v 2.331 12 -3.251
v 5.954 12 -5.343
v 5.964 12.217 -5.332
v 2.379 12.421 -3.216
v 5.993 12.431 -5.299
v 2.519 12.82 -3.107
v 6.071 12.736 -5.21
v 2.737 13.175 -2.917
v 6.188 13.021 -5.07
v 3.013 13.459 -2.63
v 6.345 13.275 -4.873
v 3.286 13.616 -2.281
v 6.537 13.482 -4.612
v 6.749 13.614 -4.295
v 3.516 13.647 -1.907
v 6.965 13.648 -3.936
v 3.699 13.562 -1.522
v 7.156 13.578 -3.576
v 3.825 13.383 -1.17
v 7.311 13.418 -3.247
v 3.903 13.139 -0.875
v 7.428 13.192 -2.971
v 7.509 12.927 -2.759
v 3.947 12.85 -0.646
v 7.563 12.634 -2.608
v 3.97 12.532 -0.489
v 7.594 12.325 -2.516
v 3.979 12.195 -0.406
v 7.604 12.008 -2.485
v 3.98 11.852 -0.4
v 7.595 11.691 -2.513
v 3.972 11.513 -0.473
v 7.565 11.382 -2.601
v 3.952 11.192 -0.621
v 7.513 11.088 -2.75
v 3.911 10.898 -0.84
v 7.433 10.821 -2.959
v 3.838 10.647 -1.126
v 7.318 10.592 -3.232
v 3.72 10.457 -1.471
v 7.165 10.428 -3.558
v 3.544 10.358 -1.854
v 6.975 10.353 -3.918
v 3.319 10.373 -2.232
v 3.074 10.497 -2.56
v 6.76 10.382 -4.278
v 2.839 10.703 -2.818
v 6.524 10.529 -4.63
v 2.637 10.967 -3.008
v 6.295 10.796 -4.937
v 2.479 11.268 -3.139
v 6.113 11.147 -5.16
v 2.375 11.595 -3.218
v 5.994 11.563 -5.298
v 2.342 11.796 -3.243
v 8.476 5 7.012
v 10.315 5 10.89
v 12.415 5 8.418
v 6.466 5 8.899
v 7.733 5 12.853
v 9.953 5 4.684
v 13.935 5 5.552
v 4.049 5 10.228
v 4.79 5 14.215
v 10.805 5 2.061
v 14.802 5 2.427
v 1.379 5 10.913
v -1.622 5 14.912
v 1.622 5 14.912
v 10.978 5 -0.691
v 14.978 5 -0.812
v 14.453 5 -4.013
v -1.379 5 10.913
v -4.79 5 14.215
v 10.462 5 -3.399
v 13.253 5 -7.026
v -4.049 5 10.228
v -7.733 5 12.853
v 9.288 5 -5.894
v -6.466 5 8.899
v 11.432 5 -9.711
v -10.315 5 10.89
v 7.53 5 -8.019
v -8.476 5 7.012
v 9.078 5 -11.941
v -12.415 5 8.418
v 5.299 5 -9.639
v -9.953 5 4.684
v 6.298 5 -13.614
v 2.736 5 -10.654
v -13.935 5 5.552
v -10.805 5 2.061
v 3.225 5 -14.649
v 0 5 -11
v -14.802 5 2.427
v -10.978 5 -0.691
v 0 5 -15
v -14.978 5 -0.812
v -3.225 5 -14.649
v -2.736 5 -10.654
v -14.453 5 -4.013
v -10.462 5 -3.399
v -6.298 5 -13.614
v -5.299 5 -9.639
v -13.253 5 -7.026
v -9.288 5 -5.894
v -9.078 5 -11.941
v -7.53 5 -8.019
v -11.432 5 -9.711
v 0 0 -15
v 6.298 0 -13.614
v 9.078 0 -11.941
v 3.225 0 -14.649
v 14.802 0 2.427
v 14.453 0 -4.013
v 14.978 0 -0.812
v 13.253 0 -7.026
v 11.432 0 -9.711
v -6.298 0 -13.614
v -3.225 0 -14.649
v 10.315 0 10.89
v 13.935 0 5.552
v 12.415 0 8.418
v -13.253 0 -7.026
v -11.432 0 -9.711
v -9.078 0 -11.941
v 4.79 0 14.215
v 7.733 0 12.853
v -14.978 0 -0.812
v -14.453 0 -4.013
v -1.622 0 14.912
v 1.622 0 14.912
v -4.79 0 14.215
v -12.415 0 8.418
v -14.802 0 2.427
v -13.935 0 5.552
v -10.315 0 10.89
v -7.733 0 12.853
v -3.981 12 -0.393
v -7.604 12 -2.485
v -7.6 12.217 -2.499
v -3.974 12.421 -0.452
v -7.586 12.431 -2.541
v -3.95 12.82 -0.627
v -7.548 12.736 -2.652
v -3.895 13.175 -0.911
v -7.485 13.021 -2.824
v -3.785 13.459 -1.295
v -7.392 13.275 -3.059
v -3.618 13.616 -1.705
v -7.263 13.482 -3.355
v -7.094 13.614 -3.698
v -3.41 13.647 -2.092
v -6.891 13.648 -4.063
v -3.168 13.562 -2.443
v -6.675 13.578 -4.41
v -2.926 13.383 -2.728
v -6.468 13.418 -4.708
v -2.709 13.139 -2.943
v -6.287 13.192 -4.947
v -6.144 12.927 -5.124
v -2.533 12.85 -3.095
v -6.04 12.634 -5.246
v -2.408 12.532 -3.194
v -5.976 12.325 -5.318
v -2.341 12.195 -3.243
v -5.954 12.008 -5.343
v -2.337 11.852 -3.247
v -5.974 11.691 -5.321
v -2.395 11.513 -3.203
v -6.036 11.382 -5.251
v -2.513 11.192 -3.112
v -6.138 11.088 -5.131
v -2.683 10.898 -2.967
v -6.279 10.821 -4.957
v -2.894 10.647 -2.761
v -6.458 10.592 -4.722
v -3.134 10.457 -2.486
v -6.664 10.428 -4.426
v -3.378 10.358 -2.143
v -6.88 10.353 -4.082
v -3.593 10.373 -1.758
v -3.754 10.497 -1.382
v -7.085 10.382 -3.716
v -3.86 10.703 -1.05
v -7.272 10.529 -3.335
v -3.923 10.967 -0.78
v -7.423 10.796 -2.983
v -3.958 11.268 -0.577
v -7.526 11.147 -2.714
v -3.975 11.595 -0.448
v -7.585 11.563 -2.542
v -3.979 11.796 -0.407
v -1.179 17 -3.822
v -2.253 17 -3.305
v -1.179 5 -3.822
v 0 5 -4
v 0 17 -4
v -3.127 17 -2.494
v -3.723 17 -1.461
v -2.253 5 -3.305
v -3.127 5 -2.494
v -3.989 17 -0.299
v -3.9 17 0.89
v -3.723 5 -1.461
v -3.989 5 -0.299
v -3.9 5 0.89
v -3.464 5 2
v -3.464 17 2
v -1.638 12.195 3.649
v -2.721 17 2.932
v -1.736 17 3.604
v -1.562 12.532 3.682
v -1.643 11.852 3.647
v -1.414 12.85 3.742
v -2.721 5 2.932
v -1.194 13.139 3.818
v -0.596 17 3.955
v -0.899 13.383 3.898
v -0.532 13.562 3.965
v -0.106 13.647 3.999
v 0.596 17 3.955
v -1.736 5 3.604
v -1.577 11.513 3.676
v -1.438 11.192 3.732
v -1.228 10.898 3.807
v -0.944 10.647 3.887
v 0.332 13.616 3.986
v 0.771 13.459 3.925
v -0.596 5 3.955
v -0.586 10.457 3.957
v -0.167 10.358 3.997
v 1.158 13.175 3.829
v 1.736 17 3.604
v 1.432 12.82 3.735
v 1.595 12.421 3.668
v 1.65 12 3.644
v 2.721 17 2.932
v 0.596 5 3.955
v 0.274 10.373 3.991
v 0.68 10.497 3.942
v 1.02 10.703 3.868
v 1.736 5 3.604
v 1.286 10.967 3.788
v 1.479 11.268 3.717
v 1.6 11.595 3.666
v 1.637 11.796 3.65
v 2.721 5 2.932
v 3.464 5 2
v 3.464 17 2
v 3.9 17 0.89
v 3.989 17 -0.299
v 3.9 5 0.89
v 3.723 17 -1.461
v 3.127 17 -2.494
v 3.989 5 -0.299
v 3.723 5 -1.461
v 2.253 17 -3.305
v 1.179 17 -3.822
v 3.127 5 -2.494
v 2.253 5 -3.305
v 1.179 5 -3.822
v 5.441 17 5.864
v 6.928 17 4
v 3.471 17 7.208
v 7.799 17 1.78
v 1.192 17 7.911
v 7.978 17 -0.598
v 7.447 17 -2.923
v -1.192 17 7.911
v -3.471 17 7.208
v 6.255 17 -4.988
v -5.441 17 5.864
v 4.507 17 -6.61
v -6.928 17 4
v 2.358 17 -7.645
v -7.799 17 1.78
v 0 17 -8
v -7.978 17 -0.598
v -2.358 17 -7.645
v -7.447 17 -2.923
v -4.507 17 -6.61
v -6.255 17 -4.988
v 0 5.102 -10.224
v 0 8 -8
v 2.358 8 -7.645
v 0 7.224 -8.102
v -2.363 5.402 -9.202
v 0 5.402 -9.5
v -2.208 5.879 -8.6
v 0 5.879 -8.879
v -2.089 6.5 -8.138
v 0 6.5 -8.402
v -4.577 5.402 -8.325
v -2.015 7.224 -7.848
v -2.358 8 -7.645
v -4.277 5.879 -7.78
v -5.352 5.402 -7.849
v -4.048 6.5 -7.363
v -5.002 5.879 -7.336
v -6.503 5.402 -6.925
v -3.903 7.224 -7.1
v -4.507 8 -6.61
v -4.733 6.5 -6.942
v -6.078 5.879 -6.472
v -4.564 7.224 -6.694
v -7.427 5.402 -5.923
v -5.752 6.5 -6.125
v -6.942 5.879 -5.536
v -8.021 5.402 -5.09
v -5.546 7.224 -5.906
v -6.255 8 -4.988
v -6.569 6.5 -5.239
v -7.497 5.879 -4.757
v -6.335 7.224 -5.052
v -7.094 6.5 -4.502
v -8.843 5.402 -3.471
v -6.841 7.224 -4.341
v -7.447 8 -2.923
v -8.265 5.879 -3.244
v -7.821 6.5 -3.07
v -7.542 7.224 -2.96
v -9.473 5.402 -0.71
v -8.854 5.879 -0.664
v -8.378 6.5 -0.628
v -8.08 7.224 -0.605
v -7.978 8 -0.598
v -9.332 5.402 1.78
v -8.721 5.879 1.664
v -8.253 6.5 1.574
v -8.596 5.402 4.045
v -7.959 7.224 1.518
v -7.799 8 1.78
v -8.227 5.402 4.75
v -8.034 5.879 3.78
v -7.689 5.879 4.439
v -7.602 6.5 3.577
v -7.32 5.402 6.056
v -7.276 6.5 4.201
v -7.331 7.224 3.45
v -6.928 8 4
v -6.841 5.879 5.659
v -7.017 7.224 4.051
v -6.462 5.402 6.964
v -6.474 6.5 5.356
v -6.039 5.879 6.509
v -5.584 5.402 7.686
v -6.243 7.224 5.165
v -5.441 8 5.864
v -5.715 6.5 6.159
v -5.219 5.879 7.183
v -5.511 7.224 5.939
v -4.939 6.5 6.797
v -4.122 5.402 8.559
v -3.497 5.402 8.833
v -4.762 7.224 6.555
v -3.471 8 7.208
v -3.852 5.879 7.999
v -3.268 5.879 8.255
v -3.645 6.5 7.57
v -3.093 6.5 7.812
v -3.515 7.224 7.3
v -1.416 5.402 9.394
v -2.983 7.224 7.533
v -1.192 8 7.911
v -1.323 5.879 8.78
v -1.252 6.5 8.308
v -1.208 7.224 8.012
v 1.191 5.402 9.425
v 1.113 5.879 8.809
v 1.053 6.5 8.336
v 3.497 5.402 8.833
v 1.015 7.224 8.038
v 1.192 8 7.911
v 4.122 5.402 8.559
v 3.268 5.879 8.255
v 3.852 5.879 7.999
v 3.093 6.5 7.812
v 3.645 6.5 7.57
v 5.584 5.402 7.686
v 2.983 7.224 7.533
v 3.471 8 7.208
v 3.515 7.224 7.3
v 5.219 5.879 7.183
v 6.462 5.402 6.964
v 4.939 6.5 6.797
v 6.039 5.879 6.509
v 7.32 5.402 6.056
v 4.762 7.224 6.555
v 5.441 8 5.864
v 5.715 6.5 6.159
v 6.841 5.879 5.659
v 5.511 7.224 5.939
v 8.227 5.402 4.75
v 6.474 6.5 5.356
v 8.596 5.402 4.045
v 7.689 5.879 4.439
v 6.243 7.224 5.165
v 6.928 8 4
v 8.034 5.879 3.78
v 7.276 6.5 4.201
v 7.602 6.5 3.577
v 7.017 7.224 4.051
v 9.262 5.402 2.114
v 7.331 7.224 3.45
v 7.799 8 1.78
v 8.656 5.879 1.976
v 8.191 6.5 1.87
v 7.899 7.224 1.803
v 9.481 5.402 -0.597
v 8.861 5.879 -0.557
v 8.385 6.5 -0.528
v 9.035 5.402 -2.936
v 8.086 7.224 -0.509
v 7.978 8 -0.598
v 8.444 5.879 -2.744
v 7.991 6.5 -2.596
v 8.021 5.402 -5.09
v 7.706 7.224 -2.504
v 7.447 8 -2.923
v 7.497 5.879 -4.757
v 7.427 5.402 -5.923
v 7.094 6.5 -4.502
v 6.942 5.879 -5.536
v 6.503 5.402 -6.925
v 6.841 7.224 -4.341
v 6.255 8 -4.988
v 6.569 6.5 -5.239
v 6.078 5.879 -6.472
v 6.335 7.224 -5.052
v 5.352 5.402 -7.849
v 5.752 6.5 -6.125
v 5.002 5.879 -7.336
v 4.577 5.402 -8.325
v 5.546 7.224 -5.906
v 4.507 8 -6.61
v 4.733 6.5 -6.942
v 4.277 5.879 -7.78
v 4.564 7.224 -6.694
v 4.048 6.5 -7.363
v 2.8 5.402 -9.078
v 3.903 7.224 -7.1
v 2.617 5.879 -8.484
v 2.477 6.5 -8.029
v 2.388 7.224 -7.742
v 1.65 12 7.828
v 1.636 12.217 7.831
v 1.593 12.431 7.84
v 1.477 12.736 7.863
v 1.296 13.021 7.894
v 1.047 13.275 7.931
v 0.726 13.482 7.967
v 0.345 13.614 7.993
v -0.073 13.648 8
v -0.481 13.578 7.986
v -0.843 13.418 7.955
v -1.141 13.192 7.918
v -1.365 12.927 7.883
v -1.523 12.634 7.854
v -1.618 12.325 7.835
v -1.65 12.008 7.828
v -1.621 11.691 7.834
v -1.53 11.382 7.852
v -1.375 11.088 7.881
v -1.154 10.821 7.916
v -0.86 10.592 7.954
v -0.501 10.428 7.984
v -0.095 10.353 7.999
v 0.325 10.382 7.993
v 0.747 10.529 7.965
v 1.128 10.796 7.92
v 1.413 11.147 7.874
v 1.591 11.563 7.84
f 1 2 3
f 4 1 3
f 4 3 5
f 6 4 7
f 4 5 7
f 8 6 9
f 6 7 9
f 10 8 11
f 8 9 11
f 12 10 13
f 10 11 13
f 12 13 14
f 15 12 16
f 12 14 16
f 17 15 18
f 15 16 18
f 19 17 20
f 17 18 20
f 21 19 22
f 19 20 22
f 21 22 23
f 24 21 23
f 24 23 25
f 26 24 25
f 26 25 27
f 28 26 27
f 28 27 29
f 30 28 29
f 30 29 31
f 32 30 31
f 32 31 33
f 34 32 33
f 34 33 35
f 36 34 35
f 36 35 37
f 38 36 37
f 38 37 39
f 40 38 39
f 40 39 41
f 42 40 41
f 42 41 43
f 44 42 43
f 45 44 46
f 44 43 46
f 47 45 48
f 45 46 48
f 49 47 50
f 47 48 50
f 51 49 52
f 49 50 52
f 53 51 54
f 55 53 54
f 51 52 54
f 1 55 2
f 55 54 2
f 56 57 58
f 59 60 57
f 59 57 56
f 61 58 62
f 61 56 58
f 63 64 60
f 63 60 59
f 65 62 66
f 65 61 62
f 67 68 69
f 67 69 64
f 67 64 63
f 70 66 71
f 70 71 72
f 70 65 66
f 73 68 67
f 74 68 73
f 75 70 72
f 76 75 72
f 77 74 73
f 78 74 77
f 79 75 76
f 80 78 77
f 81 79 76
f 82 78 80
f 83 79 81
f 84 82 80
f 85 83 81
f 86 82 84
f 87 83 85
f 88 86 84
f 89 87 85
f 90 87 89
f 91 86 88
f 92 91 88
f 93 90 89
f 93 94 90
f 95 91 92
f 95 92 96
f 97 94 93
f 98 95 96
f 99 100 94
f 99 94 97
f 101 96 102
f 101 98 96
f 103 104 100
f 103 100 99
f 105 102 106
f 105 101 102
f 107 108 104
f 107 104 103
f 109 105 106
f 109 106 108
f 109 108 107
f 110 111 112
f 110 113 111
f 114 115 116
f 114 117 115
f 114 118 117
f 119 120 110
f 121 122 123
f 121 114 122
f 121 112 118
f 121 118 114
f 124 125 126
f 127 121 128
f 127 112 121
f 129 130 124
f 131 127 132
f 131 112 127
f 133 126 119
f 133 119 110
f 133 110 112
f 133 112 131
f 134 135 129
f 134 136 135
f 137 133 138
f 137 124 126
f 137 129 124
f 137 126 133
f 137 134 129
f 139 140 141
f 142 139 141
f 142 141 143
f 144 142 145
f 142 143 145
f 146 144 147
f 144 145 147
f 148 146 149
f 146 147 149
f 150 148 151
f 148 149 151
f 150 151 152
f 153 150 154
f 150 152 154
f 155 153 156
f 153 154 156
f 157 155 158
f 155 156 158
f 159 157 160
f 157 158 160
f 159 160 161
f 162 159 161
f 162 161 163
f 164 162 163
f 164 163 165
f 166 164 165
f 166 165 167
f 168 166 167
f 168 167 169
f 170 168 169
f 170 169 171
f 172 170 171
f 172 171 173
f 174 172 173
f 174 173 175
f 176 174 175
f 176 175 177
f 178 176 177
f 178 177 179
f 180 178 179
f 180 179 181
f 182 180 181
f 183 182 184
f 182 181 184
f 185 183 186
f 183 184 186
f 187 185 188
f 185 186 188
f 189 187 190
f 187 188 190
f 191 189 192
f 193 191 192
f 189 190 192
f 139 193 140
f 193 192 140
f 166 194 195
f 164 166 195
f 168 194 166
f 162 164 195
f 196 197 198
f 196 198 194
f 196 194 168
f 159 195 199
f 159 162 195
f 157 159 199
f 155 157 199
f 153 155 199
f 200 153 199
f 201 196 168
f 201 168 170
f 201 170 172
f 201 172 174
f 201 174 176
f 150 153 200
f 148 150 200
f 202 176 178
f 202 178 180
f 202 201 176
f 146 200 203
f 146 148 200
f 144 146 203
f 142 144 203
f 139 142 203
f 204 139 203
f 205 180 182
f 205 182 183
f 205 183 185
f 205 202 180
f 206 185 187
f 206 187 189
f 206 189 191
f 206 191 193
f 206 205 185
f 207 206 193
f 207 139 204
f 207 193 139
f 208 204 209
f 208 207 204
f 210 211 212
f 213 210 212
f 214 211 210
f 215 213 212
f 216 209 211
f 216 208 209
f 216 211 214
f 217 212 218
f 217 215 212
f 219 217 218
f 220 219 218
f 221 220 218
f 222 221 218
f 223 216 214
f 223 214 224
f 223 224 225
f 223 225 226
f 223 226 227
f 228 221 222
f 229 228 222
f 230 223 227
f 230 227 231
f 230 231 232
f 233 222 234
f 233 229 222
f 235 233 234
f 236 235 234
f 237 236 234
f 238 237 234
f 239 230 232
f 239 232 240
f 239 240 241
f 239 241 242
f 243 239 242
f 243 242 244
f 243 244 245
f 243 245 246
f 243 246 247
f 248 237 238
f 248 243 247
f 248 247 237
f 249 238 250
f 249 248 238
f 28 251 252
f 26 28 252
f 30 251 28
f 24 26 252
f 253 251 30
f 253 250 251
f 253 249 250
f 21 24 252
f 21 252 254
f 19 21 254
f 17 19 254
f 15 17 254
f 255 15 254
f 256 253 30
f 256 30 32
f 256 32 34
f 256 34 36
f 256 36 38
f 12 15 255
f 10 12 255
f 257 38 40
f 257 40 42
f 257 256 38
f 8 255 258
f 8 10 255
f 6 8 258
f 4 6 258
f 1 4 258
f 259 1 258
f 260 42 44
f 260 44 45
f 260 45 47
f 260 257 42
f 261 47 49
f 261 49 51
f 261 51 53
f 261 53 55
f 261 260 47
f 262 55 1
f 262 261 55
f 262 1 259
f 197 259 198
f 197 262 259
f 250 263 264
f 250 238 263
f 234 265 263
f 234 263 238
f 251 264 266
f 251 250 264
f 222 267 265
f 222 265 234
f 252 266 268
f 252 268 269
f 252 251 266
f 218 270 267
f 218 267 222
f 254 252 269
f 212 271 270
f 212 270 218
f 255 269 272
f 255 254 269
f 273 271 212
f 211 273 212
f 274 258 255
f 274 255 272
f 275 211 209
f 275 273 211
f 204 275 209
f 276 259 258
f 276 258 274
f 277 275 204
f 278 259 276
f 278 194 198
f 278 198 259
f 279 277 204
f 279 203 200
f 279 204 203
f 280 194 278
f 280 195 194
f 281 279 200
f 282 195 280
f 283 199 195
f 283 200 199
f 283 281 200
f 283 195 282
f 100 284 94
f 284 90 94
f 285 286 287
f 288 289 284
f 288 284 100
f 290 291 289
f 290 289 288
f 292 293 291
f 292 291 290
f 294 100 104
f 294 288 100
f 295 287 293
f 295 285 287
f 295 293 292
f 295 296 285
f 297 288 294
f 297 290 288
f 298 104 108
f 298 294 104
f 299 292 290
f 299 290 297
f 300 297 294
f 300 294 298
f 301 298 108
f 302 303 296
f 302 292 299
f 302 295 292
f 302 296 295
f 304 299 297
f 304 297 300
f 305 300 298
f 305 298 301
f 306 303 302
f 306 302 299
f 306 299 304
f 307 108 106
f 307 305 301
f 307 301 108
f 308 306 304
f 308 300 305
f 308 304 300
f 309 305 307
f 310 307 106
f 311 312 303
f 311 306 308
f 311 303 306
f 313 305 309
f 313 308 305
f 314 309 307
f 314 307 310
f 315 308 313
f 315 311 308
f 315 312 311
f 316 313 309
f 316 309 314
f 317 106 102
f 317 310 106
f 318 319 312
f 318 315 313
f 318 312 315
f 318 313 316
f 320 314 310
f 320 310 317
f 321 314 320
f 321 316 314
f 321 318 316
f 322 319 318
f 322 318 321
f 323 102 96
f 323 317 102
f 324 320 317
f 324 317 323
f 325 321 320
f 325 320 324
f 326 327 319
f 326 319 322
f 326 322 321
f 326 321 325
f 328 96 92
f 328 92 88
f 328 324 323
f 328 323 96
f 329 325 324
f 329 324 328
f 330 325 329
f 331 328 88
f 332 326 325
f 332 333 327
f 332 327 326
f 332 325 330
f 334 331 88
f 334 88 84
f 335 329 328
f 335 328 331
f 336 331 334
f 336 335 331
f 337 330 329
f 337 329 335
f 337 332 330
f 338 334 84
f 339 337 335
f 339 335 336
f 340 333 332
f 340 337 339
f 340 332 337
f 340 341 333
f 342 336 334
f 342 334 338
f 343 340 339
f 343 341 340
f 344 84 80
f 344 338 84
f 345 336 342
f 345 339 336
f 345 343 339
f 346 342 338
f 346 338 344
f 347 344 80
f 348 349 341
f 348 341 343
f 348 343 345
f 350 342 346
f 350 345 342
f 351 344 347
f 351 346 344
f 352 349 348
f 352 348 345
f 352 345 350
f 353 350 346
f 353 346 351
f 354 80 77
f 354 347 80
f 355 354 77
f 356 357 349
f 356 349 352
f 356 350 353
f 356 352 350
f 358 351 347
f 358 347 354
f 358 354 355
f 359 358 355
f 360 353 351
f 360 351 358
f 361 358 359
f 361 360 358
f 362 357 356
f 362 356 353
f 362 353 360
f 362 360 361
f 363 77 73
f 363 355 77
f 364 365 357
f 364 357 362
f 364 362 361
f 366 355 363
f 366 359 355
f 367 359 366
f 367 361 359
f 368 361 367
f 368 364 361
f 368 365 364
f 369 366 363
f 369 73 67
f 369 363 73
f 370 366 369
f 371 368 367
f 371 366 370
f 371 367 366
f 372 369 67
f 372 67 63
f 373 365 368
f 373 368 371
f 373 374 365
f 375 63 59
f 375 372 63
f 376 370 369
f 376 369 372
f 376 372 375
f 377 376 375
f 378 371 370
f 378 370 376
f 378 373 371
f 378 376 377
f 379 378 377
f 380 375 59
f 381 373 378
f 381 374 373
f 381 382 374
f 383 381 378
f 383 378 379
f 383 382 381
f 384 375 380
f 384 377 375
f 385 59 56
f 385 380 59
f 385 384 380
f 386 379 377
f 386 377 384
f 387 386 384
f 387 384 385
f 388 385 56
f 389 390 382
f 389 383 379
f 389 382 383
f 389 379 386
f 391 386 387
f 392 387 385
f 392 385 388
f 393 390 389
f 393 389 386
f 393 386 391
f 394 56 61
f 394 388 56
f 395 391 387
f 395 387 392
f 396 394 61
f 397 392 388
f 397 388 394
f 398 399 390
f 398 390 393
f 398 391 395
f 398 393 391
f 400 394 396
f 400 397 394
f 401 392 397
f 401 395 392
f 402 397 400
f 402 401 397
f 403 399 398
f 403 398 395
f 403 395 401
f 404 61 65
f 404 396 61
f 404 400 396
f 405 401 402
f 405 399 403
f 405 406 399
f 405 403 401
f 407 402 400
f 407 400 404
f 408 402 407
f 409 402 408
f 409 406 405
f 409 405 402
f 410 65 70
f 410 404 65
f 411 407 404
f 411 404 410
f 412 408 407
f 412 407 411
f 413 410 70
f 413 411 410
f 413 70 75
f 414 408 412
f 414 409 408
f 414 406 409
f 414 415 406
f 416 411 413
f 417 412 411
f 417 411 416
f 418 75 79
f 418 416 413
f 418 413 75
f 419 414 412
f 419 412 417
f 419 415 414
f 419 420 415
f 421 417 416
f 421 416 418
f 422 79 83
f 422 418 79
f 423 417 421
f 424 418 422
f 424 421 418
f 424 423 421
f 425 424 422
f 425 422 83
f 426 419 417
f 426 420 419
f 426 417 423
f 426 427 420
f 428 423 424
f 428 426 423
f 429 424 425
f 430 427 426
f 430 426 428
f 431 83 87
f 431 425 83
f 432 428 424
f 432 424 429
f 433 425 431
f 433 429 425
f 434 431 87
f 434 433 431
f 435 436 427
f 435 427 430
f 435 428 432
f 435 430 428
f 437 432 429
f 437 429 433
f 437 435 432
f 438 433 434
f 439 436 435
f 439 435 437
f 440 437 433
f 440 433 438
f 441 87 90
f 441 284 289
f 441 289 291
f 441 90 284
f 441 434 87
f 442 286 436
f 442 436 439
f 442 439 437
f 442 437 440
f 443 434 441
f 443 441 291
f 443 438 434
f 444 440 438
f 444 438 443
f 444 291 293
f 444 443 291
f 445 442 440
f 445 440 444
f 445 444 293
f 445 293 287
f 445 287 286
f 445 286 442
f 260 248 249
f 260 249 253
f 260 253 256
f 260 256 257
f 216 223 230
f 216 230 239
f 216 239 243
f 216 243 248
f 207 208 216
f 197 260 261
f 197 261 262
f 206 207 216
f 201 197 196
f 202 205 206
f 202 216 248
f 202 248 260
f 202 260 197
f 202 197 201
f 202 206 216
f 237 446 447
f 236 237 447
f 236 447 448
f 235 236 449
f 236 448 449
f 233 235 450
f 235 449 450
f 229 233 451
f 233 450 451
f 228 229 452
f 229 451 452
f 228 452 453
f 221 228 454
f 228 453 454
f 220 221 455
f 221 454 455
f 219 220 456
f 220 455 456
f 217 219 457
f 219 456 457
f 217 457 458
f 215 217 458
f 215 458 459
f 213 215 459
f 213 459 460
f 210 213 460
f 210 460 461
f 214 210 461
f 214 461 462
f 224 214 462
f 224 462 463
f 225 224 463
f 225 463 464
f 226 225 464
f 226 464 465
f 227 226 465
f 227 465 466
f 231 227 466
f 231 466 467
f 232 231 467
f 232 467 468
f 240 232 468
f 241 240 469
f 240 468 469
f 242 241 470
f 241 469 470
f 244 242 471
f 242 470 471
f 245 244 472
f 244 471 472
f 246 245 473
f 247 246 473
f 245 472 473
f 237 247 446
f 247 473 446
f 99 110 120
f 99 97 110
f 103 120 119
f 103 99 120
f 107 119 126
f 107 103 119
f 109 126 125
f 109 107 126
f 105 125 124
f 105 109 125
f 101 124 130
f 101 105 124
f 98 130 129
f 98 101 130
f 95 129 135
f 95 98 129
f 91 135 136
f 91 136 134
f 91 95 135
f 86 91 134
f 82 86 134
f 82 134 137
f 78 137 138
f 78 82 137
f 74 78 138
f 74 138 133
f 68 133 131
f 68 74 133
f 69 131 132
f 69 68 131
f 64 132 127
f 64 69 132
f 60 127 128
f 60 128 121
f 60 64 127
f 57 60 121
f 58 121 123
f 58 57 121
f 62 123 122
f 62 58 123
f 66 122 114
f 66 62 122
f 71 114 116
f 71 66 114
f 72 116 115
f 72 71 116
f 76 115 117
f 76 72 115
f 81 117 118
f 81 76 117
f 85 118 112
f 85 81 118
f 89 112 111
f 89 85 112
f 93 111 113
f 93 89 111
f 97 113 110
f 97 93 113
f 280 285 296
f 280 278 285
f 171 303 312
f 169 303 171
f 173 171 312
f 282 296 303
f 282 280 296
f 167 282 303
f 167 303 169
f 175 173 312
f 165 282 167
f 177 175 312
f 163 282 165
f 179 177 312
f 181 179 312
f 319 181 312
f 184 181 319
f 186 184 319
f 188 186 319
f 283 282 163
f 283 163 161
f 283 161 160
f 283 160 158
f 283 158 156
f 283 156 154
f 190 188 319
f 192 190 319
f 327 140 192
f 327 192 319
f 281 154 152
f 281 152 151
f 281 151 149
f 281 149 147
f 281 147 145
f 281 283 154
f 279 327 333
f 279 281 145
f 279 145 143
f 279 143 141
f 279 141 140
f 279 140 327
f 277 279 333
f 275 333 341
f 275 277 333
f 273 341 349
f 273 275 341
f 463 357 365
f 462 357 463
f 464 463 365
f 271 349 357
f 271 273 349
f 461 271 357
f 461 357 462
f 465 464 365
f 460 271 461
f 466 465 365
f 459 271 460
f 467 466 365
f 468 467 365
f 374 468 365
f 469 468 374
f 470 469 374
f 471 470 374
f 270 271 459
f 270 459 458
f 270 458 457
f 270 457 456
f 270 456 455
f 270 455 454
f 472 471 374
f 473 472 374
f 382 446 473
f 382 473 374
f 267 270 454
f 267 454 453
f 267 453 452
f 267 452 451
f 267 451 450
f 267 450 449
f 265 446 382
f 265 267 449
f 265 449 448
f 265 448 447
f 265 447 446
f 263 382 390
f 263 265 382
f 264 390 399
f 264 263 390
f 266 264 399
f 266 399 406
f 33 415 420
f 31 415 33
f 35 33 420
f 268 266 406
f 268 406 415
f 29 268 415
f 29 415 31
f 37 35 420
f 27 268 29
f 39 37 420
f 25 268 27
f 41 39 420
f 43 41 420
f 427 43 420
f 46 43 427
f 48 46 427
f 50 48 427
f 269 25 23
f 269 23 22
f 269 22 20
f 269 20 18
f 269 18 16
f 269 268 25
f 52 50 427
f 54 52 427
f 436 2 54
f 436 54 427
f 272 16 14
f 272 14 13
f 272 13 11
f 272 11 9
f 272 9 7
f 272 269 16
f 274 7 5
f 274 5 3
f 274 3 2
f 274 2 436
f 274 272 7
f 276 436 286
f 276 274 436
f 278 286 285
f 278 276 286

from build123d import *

# Parameters (mm, degrees)
FILLET1_R              = 3
M4_TAPPED_HOLE1_REACH  = 34.296
M4_TAPPED_HOLE1_BORE_R = 1.65
CIRPATTERN1_COUNT      = 3


with BuildPart() as part:
    # Sketch1 → Revolve1 (revolve)
    with BuildSketch(Plane.XY, mode=Mode.PRIVATE) as revolve1_sk:
        Polygon((0, 0), (15, 0), (15, 5), (8, 5), (8, 17), (4, 17), (4, 5), (0, 5), align=None)
    revolve(revolve1_sk.sketch.rotate(Axis((0, 0, 0), (0, 1, 0)), 90), axis=Axis((0, 0, 0), (0, 1, 0)))

    # Fillet1
    fillet1_edges = [part.edges().sort_by_distance(p)[0] for p in [
        (0, 5, 8),
    ]]
    fillet(fillet1_edges, radius=FILLET1_R)

    # M4 Tapped Hole1 bore → M4 Tapped Hole1 (cut, up to next)
    with BuildSketch(Plane.XY.offset(8), mode=Mode.PRIVATE) as m4_tapped_hole1_sk1:
        with Locations((0, 12)):
            Circle(M4_TAPPED_HOLE1_BORE_R)
    m4_tapped_hole1_tool1 = extrude(m4_tapped_hole1_sk1.sketch, amount=-M4_TAPPED_HOLE1_REACH, mode=Mode.PRIVATE) & part.part
    m4_tapped_hole1 = m4_tapped_hole1_tool1.solids().sort_by_distance((0, 12, 8))[0]
    add(m4_tapped_hole1, mode=Mode.SUBTRACT)

    # CirPattern1: M4 Tapped Hole1 ×3 about axis
    cirpattern1_axis = Axis((0, 17, 0), (0, -1, 0))
    for i in range(1, CIRPATTERN1_COUNT):
        add(m4_tapped_hole1.rotate(cirpattern1_axis, i * 360 / CIRPATTERN1_COUNT), mode=Mode.SUBTRACT)


solid = part.part
